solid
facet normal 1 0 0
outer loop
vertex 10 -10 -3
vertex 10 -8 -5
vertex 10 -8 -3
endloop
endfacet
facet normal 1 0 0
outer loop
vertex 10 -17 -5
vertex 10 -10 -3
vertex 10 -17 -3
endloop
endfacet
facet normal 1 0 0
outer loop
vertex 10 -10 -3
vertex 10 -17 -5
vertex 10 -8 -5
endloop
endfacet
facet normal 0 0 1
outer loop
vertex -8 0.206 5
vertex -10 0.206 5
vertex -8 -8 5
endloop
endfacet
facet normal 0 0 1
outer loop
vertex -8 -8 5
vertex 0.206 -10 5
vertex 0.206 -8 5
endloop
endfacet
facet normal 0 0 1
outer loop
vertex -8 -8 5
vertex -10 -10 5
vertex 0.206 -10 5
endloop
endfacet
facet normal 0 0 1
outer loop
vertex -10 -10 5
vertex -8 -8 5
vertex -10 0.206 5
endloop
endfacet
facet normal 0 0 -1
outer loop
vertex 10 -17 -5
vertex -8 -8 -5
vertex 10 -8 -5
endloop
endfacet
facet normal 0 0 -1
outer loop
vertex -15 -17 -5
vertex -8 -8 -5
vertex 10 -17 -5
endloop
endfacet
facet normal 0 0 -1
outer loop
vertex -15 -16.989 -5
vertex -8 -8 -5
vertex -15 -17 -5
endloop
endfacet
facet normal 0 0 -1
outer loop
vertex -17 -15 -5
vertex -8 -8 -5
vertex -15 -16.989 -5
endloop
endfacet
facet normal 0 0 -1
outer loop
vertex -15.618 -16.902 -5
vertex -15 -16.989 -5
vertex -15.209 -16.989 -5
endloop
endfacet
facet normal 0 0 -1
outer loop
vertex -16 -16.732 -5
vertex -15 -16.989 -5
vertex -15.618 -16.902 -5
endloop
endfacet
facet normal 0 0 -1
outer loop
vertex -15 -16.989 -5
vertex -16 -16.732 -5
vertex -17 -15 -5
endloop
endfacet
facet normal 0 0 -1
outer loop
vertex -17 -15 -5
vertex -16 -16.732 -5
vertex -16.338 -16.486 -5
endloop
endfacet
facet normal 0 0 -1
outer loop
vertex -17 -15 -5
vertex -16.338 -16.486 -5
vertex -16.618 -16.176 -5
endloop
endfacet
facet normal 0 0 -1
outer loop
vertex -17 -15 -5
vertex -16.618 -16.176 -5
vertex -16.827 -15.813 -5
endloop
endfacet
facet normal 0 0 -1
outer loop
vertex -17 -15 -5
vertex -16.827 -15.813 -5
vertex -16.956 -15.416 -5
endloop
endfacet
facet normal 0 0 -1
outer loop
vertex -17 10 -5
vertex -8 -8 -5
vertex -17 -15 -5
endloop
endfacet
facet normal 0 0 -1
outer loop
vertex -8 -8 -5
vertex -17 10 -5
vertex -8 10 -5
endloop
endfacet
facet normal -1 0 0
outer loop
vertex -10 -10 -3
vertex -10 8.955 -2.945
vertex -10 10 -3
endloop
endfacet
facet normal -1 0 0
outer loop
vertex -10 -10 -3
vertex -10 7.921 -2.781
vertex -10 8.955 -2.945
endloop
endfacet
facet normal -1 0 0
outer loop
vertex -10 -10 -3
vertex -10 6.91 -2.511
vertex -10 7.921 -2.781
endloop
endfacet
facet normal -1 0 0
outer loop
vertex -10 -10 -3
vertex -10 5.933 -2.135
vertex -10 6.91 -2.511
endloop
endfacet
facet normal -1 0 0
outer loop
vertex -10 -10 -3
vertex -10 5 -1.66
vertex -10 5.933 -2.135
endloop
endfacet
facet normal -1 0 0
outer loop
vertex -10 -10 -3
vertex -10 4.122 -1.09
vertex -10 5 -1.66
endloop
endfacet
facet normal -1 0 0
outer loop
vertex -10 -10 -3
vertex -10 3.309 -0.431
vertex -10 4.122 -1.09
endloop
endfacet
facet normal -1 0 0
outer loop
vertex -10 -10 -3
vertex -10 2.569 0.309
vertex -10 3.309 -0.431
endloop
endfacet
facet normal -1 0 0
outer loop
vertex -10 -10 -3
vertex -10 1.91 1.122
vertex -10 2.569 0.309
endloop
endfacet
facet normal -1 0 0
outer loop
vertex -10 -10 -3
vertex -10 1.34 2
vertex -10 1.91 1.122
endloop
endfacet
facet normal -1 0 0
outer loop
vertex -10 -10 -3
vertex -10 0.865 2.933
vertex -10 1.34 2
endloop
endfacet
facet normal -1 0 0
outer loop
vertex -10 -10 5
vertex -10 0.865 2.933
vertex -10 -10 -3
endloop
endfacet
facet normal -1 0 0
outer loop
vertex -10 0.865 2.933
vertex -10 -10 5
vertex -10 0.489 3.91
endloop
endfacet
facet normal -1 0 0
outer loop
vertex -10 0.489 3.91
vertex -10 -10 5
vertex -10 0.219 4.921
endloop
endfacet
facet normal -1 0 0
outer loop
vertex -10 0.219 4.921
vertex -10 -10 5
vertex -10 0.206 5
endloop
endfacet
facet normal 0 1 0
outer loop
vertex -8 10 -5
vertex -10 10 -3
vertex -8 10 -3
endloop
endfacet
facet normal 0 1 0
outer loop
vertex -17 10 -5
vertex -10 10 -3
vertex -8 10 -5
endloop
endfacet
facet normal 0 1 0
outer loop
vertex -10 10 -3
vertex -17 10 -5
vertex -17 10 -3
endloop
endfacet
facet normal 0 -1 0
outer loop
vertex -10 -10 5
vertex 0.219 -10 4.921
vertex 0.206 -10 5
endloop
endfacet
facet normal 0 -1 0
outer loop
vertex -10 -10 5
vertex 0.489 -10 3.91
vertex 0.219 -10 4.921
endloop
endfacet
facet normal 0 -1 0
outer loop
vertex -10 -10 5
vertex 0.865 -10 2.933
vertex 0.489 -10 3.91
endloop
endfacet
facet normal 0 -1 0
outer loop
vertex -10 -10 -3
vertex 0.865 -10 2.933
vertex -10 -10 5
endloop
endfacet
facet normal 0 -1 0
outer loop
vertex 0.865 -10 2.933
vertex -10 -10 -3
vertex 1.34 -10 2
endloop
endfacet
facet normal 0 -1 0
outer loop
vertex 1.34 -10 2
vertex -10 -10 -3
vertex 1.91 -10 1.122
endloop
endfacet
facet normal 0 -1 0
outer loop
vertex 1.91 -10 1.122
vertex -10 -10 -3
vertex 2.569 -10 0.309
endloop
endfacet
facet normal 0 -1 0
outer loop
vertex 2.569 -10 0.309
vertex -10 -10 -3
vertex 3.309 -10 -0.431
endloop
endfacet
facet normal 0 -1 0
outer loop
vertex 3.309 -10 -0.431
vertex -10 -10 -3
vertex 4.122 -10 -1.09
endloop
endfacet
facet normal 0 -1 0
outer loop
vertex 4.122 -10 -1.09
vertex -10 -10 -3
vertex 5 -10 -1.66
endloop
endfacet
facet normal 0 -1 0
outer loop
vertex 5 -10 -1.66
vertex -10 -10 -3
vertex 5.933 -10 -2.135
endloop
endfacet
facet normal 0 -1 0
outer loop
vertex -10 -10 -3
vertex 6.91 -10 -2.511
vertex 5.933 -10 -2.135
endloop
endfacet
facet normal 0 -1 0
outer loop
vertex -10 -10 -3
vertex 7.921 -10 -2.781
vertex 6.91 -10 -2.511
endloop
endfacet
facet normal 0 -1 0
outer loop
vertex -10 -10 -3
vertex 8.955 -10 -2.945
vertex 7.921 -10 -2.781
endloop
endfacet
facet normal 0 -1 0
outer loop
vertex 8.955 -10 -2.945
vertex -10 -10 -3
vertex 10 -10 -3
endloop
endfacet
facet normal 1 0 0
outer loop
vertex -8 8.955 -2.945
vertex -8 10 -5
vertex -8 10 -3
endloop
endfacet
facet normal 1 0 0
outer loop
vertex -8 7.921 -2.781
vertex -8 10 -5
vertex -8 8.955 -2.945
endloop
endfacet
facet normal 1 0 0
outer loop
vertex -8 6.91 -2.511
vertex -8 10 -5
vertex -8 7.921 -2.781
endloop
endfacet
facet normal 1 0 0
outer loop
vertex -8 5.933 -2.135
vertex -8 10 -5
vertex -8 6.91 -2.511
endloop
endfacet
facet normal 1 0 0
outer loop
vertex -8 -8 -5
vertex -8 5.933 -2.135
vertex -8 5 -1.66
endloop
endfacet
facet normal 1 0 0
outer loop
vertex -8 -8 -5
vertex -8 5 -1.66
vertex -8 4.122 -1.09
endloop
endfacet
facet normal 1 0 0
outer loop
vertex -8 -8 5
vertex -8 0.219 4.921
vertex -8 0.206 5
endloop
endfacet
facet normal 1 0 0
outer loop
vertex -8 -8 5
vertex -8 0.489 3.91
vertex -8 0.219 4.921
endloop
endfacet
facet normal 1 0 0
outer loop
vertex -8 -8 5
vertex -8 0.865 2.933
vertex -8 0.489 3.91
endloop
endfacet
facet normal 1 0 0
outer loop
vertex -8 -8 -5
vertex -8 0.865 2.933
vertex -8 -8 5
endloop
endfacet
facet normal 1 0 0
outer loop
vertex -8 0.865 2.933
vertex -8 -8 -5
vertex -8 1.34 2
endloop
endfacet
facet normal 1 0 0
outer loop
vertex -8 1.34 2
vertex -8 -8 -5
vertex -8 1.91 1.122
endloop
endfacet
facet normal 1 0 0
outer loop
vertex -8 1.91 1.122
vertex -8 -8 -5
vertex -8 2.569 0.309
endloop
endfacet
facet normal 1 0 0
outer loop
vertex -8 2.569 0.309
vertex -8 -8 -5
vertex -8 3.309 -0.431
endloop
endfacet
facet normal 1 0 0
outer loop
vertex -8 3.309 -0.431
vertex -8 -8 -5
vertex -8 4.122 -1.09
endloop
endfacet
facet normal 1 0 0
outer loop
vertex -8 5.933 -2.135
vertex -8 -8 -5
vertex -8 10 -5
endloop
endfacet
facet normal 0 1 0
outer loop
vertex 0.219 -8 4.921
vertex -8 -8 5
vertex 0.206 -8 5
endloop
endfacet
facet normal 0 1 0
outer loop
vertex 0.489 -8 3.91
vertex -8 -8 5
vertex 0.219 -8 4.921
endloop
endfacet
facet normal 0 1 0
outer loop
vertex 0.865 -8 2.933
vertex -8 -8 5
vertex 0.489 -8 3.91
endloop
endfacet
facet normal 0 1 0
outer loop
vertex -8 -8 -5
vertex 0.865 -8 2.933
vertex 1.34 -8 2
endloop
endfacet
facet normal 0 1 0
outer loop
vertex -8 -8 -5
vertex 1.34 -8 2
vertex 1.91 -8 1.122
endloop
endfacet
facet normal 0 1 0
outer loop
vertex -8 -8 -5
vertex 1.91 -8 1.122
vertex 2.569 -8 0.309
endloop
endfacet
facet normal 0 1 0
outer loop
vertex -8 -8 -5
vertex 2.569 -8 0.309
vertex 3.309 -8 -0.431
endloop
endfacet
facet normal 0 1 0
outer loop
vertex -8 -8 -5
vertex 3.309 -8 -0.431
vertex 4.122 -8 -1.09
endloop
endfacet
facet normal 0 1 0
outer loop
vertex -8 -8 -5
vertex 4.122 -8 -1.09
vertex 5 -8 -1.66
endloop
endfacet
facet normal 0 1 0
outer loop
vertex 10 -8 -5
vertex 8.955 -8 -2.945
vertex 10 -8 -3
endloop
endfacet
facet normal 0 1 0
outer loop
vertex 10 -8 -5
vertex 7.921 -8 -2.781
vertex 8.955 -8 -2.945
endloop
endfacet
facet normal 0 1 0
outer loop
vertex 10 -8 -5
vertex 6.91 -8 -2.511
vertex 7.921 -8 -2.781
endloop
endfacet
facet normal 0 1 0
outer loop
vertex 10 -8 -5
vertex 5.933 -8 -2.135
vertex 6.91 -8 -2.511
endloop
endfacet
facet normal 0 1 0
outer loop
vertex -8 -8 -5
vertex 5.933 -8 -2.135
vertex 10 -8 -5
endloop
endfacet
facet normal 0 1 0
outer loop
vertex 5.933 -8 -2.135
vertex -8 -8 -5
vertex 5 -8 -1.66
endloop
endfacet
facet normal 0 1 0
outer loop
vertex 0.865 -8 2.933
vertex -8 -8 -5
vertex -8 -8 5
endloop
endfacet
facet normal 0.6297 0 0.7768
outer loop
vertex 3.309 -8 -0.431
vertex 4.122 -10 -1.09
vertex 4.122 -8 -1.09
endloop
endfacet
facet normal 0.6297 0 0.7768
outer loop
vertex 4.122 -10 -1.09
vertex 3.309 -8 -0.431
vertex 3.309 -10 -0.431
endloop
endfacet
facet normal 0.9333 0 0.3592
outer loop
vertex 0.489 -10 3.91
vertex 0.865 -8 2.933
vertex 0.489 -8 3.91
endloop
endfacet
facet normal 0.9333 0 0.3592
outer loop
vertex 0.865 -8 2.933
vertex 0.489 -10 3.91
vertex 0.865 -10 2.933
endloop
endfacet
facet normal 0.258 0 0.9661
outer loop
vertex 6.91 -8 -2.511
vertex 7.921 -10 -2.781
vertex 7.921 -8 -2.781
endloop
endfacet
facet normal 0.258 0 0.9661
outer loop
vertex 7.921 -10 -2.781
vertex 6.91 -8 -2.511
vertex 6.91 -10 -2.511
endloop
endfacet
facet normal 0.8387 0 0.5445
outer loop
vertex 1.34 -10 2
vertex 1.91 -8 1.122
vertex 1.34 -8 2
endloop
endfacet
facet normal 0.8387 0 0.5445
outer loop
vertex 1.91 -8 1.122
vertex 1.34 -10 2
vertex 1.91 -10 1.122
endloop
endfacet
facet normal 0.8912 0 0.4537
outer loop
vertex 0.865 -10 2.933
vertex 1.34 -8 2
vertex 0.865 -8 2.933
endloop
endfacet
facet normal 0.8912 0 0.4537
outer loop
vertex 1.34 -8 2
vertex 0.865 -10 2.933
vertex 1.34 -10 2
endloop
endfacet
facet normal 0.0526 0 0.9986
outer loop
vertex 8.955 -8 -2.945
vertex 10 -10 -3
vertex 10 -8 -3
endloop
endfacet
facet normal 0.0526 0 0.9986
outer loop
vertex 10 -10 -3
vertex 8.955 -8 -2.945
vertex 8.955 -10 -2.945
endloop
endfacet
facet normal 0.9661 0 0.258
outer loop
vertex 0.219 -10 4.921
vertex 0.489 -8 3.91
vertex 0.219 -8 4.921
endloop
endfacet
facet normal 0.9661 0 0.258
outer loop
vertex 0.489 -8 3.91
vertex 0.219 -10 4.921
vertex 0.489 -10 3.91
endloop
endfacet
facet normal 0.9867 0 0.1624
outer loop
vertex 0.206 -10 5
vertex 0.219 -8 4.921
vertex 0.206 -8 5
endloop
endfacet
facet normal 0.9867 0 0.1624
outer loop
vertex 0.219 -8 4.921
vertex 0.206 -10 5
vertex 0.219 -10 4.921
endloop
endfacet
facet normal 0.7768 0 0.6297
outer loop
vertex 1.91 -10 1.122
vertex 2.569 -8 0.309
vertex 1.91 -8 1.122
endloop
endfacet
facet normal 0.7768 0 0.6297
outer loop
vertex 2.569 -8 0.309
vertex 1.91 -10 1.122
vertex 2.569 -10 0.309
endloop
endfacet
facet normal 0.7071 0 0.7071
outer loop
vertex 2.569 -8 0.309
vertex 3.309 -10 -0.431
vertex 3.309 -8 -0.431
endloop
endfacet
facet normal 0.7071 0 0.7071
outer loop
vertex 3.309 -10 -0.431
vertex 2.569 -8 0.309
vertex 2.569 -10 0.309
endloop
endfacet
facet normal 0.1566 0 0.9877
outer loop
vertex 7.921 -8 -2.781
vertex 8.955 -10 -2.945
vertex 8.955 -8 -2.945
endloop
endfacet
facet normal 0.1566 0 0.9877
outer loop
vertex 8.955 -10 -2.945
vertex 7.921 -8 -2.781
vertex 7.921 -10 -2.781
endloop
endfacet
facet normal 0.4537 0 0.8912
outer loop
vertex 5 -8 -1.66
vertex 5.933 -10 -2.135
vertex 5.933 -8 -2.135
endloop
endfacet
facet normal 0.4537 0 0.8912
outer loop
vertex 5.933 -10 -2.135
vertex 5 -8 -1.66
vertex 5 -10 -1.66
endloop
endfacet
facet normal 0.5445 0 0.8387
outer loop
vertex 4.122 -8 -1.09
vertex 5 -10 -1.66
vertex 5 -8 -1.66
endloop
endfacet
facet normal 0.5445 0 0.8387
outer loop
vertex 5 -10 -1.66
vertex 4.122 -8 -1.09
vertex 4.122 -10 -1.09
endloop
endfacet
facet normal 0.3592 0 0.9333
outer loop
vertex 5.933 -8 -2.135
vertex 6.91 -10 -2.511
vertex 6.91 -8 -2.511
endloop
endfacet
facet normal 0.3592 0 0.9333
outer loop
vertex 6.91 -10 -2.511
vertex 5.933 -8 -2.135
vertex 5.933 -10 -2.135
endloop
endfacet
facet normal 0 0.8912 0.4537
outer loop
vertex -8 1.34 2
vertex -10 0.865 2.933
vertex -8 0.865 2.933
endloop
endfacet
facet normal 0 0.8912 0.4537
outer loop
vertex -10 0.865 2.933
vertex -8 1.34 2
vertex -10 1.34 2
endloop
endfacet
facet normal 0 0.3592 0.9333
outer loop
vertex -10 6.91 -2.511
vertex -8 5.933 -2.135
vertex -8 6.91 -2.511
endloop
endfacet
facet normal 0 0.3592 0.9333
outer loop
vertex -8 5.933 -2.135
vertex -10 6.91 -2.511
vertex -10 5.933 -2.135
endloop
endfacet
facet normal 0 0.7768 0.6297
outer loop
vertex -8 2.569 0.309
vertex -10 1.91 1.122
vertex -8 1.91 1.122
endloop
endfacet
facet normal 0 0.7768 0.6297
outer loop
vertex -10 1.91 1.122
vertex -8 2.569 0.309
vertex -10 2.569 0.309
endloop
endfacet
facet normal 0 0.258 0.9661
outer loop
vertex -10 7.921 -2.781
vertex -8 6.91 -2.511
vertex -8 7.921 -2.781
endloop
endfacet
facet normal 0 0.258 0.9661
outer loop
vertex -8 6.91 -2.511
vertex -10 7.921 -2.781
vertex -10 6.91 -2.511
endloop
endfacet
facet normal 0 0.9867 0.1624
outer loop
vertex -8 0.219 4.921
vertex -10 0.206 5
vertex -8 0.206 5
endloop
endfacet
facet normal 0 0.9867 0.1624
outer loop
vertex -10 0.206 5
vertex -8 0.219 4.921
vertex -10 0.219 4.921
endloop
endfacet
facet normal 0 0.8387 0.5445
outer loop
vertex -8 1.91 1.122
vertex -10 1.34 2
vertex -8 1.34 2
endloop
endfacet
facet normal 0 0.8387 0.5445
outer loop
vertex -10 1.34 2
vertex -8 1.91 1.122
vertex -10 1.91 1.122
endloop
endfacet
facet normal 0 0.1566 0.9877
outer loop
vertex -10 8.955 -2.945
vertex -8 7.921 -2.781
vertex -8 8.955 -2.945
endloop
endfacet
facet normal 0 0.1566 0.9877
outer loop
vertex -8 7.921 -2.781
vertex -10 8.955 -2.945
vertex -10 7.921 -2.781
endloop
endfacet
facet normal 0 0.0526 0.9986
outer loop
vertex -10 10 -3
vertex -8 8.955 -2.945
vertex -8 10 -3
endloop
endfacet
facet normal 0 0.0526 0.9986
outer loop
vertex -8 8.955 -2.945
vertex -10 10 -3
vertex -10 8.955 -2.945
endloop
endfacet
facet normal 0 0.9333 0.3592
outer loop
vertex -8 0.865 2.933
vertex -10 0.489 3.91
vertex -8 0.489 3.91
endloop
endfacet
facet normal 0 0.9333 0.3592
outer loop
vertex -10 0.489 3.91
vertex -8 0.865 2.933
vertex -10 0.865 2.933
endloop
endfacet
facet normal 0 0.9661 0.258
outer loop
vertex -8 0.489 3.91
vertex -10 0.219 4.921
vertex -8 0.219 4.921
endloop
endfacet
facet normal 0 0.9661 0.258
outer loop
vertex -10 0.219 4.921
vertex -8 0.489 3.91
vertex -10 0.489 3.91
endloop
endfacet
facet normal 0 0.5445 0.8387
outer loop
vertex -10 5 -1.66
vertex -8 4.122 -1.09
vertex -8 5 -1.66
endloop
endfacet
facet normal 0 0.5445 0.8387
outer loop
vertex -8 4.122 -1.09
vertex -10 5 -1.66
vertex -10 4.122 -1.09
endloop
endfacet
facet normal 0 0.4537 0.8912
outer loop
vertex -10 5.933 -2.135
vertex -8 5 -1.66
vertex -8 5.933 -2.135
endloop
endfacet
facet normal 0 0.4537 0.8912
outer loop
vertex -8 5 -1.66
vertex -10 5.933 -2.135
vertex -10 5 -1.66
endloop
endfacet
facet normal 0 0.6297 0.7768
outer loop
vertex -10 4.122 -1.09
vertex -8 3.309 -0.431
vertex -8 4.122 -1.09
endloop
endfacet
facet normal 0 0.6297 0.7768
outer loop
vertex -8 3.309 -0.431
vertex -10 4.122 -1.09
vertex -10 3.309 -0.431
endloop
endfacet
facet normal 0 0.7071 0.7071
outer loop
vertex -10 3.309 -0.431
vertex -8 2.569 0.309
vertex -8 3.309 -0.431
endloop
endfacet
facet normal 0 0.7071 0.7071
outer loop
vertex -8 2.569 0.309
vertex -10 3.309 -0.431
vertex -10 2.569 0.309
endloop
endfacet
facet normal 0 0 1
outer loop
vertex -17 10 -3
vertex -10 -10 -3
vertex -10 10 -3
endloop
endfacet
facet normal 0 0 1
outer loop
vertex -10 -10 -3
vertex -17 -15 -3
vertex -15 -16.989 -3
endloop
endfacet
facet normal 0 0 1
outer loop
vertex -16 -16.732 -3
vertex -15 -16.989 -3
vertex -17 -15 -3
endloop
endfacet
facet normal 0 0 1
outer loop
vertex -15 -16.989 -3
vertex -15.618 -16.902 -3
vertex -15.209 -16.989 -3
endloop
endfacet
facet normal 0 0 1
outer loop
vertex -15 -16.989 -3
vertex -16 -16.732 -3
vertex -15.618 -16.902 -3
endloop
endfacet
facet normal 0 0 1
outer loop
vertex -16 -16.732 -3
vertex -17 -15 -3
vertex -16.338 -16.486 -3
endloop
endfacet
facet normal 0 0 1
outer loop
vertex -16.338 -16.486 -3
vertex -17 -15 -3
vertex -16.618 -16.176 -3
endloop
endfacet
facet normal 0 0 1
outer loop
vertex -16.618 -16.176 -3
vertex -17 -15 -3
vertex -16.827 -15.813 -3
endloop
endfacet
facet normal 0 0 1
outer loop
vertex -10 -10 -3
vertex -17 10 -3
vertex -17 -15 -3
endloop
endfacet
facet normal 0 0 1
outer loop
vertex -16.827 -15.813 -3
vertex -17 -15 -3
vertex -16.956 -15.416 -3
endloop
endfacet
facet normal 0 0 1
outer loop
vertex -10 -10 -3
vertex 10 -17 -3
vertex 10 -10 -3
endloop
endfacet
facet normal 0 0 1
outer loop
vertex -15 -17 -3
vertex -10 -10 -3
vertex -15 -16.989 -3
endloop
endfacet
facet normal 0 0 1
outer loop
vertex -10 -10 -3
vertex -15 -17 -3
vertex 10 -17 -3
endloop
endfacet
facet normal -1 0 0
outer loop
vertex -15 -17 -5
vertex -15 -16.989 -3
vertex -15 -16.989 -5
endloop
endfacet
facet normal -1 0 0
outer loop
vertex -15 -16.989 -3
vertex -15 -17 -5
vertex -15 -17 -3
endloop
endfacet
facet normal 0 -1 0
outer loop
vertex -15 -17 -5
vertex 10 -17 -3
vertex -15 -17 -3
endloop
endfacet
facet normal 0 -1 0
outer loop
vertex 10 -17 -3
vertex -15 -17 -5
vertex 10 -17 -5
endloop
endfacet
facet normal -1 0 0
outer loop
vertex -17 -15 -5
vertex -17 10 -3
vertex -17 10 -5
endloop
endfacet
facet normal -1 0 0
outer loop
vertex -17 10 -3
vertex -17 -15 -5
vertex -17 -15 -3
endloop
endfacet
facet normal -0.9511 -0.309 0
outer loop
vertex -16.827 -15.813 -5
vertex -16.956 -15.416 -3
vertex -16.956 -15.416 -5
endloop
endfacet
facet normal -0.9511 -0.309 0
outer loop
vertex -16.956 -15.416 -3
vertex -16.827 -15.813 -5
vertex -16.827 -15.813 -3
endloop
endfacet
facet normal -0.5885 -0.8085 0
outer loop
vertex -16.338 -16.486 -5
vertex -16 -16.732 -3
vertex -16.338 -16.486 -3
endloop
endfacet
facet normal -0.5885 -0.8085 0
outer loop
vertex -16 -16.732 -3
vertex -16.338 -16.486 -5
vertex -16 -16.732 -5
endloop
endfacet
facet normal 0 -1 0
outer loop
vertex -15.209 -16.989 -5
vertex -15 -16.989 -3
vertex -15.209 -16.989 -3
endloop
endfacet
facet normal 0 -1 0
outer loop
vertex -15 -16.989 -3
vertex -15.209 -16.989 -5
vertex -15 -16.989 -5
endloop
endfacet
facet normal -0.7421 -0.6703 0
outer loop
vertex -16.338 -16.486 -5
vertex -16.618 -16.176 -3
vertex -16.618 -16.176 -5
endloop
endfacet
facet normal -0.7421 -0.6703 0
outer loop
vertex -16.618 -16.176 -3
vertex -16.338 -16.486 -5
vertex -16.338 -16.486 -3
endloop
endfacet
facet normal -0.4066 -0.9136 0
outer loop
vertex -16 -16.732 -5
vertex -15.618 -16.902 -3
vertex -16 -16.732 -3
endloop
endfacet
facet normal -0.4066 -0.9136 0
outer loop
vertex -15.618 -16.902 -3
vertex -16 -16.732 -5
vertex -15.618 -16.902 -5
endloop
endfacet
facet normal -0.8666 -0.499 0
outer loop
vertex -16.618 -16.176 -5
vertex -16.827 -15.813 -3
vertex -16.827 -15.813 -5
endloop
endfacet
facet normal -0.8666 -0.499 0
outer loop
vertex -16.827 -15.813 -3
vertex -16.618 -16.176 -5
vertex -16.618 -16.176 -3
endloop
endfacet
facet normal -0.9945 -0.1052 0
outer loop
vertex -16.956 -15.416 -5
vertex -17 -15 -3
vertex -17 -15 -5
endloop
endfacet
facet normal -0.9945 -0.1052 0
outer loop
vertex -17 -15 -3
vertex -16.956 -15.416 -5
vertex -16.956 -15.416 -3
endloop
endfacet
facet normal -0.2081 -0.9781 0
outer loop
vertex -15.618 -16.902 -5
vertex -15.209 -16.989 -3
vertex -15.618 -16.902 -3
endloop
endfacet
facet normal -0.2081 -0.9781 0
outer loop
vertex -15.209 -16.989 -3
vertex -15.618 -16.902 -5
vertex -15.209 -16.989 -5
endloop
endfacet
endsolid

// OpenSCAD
include<lib.scad>

c=20;
h=10;
t=2;
w=5;

epsilon=0.02;

corner_hold(c, h, t, w, epsilon);
